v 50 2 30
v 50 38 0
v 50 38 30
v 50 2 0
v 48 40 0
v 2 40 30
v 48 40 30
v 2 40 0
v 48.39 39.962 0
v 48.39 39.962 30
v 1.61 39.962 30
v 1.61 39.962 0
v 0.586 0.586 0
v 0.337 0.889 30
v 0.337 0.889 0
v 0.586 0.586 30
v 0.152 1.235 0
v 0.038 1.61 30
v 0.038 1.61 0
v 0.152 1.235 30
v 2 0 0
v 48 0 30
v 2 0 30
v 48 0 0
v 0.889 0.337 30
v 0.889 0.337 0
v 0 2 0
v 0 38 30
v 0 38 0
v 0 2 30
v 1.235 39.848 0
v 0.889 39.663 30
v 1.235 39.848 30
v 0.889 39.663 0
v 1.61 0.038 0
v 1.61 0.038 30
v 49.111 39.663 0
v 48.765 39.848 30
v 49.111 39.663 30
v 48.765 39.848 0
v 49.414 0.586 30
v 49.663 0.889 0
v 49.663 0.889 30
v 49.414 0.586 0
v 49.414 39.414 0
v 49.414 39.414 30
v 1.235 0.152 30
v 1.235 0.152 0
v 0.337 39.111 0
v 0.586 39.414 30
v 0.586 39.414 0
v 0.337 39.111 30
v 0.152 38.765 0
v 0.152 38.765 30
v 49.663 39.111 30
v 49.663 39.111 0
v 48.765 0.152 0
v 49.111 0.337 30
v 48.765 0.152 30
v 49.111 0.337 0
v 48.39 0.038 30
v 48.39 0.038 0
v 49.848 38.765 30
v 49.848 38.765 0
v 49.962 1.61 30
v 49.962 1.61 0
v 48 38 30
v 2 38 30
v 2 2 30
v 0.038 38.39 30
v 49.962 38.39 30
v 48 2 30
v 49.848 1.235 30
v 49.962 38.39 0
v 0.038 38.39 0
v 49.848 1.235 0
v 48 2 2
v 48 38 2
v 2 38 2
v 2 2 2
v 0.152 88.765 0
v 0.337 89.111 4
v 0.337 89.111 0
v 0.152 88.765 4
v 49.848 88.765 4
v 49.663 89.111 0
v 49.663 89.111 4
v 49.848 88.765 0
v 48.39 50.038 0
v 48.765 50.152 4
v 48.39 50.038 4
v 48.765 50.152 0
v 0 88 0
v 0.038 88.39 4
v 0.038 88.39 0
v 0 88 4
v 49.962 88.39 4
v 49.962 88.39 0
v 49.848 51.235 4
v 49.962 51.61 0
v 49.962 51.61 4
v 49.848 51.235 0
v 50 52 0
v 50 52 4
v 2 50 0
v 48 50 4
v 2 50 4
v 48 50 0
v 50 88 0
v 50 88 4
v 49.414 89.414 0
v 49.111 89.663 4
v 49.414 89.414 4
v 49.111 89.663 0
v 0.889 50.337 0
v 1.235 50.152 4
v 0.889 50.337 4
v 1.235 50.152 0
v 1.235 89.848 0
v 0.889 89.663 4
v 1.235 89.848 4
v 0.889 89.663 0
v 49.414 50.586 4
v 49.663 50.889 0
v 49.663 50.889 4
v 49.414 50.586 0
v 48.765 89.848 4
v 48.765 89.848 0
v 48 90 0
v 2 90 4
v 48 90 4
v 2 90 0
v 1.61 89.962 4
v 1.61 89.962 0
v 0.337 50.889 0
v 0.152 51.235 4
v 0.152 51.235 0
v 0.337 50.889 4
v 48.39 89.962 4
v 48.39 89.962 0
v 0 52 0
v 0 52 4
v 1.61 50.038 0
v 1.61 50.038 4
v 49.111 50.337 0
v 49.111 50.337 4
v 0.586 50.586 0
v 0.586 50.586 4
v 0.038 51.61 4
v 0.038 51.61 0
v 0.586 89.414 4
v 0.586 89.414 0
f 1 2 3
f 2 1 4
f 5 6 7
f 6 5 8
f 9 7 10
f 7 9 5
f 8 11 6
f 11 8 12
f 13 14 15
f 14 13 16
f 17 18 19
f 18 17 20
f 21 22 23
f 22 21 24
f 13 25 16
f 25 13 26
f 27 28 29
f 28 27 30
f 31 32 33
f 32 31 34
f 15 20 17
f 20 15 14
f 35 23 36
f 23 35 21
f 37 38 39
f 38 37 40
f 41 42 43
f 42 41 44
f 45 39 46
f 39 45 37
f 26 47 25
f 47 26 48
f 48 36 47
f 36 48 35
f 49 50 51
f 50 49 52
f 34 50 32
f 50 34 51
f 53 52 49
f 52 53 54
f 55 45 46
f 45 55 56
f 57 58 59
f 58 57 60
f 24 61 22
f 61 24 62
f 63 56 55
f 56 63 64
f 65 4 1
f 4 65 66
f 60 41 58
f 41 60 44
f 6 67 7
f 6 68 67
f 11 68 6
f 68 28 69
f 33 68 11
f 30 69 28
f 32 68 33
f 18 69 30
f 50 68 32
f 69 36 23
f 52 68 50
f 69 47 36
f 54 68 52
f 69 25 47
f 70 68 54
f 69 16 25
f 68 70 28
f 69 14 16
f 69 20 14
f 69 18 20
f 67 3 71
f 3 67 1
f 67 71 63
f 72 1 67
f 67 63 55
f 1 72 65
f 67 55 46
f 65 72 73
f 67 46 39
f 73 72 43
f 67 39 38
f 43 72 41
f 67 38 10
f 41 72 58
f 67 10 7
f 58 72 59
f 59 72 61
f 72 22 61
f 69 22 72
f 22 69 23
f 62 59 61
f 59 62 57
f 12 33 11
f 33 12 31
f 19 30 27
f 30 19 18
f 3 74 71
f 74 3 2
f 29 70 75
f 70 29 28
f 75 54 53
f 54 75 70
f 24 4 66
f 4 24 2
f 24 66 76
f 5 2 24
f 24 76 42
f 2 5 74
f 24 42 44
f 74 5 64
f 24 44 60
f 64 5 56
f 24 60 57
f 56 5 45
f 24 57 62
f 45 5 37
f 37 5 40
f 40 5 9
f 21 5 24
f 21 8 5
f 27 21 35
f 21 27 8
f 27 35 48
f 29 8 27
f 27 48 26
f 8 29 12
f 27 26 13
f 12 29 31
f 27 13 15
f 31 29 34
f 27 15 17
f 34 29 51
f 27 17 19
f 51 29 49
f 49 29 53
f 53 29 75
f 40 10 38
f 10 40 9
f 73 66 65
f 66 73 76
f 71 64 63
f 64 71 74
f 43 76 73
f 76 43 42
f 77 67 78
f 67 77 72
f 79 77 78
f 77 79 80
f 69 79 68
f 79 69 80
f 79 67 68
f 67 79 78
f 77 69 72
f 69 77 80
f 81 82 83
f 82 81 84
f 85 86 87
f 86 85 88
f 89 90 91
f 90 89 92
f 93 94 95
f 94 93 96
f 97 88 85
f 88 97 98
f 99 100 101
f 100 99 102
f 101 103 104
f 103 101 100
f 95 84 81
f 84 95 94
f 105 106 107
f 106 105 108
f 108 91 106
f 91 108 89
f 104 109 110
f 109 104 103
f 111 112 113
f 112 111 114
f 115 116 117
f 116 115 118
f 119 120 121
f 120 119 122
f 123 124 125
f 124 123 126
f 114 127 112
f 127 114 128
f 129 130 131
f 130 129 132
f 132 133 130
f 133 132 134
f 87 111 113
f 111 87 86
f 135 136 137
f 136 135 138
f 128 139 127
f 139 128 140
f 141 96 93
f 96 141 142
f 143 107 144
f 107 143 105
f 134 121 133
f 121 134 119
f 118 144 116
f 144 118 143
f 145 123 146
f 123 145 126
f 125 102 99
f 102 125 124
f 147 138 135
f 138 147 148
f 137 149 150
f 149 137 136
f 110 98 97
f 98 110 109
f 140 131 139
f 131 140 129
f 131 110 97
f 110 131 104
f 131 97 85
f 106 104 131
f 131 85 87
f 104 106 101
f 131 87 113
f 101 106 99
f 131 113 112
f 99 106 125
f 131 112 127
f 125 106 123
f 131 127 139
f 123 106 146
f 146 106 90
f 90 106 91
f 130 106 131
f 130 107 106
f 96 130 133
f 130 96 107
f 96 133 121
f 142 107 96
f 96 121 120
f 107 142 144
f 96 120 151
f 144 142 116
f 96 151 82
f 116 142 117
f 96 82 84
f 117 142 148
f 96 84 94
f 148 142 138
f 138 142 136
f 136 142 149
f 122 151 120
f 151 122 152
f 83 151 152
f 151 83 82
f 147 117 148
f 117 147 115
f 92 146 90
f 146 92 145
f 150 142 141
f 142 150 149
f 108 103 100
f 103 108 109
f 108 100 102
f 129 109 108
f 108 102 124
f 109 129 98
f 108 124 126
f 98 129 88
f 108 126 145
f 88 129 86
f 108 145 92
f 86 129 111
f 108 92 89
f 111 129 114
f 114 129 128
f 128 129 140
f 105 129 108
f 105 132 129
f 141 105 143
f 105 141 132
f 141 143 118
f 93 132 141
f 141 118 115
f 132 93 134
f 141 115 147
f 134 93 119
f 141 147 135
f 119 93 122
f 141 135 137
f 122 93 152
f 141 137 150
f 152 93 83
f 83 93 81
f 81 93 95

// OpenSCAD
// Simple Parametric Box
// A basic customizable box for testing and learning
// License: CC0 (Public Domain)

/* [Dimensions] */
// Width of the box (X axis)
width = 50; // [10:100]

// Depth of the box (Y axis)
depth = 40; // [10:100]

// Height of the box (Z axis)
height = 30; // [10:100]

// Wall thickness
wall_thickness = 2; // [1:0.5:5]

/* [Features] */
// Add a lid
include_lid = "yes"; // [yes, no]

// Add ventilation holes
ventilation = "no"; // [yes, no]

// Number of holes per side @depends(ventilation==yes)
hole_count = 3; // [1:10]

// Hole diameter in mm @depends(ventilation==yes)
hole_diameter = 5; // [3:1:10]

/* [Advanced] */
// Corner radius (0 for sharp corners)
corner_radius = 2; // [0:0.5:10]

// Render quality (higher = smoother, slower)
$fn = 32; // [16:4:128]

/* [Hidden] */
// Internal variables
inner_width = width - (wall_thickness * 2);
inner_depth = depth - (wall_thickness * 2);
inner_height = height - wall_thickness;
lid_height = wall_thickness;

// Debug output - these appear in the Console panel
echo("=== Simple Box Configuration ===");
echo(str("Box dimensions: ", width, " x ", depth, " x ", height, " mm"));
echo(str("Wall thickness: ", wall_thickness, " mm"));
echo(str("Interior space: ", inner_width, " x ", inner_depth, " x ", inner_height, " mm"));
echo(str("Lid included: ", include_lid));
echo(str("Ventilation: ", ventilation));
if (ventilation == "yes") {
    echo(str("  - Hole count: ", hole_count));
    echo(str("  - Hole diameter: ", hole_diameter, " mm"));
}

// Main module
module box() {
    difference() {
        // Outer box
        if (corner_radius > 0) {
            rounded_box(width, depth, height, corner_radius);
        } else {
            cube([width, depth, height]);
        }
        
        // Hollow interior
        translate([wall_thickness, wall_thickness, wall_thickness])
            cube([inner_width, inner_depth, inner_height + 0.1]);
        
        // Ventilation holes
        if (ventilation == "yes") {
            add_ventilation_holes();
        }
    }
}

module lid() {
    if (corner_radius > 0) {
        rounded_box(width, depth, lid_height + 2, corner_radius);
    } else {
        cube([width, depth, lid_height + 2]);
    }
}

module rounded_box(w, d, h, r) {
    hull() {
        translate([r, r, 0])
            cylinder(r=r, h=h);
        translate([w-r, r, 0])
            cylinder(r=r, h=h);
        translate([r, d-r, 0])
            cylinder(r=r, h=h);
        translate([w-r, d-r, 0])
            cylinder(r=r, h=h);
    }
}

module add_ventilation_holes() {
    spacing = width / (hole_count + 1);
    
    for (i = [1:hole_count]) {
        // Front side
        translate([spacing * i, -0.1, height/2])
            rotate([-90, 0, 0])
            cylinder(d=hole_diameter, h=wall_thickness + 0.2);
        
        // Back side
        translate([spacing * i, depth - wall_thickness - 0.1, height/2])
            rotate([-90, 0, 0])
            cylinder(d=hole_diameter, h=wall_thickness + 0.2);
    }
}

// Render
if (include_lid == "yes") {
    box();
    translate([0, depth + 10, 0])
        lid();
} else {
    box();
}
